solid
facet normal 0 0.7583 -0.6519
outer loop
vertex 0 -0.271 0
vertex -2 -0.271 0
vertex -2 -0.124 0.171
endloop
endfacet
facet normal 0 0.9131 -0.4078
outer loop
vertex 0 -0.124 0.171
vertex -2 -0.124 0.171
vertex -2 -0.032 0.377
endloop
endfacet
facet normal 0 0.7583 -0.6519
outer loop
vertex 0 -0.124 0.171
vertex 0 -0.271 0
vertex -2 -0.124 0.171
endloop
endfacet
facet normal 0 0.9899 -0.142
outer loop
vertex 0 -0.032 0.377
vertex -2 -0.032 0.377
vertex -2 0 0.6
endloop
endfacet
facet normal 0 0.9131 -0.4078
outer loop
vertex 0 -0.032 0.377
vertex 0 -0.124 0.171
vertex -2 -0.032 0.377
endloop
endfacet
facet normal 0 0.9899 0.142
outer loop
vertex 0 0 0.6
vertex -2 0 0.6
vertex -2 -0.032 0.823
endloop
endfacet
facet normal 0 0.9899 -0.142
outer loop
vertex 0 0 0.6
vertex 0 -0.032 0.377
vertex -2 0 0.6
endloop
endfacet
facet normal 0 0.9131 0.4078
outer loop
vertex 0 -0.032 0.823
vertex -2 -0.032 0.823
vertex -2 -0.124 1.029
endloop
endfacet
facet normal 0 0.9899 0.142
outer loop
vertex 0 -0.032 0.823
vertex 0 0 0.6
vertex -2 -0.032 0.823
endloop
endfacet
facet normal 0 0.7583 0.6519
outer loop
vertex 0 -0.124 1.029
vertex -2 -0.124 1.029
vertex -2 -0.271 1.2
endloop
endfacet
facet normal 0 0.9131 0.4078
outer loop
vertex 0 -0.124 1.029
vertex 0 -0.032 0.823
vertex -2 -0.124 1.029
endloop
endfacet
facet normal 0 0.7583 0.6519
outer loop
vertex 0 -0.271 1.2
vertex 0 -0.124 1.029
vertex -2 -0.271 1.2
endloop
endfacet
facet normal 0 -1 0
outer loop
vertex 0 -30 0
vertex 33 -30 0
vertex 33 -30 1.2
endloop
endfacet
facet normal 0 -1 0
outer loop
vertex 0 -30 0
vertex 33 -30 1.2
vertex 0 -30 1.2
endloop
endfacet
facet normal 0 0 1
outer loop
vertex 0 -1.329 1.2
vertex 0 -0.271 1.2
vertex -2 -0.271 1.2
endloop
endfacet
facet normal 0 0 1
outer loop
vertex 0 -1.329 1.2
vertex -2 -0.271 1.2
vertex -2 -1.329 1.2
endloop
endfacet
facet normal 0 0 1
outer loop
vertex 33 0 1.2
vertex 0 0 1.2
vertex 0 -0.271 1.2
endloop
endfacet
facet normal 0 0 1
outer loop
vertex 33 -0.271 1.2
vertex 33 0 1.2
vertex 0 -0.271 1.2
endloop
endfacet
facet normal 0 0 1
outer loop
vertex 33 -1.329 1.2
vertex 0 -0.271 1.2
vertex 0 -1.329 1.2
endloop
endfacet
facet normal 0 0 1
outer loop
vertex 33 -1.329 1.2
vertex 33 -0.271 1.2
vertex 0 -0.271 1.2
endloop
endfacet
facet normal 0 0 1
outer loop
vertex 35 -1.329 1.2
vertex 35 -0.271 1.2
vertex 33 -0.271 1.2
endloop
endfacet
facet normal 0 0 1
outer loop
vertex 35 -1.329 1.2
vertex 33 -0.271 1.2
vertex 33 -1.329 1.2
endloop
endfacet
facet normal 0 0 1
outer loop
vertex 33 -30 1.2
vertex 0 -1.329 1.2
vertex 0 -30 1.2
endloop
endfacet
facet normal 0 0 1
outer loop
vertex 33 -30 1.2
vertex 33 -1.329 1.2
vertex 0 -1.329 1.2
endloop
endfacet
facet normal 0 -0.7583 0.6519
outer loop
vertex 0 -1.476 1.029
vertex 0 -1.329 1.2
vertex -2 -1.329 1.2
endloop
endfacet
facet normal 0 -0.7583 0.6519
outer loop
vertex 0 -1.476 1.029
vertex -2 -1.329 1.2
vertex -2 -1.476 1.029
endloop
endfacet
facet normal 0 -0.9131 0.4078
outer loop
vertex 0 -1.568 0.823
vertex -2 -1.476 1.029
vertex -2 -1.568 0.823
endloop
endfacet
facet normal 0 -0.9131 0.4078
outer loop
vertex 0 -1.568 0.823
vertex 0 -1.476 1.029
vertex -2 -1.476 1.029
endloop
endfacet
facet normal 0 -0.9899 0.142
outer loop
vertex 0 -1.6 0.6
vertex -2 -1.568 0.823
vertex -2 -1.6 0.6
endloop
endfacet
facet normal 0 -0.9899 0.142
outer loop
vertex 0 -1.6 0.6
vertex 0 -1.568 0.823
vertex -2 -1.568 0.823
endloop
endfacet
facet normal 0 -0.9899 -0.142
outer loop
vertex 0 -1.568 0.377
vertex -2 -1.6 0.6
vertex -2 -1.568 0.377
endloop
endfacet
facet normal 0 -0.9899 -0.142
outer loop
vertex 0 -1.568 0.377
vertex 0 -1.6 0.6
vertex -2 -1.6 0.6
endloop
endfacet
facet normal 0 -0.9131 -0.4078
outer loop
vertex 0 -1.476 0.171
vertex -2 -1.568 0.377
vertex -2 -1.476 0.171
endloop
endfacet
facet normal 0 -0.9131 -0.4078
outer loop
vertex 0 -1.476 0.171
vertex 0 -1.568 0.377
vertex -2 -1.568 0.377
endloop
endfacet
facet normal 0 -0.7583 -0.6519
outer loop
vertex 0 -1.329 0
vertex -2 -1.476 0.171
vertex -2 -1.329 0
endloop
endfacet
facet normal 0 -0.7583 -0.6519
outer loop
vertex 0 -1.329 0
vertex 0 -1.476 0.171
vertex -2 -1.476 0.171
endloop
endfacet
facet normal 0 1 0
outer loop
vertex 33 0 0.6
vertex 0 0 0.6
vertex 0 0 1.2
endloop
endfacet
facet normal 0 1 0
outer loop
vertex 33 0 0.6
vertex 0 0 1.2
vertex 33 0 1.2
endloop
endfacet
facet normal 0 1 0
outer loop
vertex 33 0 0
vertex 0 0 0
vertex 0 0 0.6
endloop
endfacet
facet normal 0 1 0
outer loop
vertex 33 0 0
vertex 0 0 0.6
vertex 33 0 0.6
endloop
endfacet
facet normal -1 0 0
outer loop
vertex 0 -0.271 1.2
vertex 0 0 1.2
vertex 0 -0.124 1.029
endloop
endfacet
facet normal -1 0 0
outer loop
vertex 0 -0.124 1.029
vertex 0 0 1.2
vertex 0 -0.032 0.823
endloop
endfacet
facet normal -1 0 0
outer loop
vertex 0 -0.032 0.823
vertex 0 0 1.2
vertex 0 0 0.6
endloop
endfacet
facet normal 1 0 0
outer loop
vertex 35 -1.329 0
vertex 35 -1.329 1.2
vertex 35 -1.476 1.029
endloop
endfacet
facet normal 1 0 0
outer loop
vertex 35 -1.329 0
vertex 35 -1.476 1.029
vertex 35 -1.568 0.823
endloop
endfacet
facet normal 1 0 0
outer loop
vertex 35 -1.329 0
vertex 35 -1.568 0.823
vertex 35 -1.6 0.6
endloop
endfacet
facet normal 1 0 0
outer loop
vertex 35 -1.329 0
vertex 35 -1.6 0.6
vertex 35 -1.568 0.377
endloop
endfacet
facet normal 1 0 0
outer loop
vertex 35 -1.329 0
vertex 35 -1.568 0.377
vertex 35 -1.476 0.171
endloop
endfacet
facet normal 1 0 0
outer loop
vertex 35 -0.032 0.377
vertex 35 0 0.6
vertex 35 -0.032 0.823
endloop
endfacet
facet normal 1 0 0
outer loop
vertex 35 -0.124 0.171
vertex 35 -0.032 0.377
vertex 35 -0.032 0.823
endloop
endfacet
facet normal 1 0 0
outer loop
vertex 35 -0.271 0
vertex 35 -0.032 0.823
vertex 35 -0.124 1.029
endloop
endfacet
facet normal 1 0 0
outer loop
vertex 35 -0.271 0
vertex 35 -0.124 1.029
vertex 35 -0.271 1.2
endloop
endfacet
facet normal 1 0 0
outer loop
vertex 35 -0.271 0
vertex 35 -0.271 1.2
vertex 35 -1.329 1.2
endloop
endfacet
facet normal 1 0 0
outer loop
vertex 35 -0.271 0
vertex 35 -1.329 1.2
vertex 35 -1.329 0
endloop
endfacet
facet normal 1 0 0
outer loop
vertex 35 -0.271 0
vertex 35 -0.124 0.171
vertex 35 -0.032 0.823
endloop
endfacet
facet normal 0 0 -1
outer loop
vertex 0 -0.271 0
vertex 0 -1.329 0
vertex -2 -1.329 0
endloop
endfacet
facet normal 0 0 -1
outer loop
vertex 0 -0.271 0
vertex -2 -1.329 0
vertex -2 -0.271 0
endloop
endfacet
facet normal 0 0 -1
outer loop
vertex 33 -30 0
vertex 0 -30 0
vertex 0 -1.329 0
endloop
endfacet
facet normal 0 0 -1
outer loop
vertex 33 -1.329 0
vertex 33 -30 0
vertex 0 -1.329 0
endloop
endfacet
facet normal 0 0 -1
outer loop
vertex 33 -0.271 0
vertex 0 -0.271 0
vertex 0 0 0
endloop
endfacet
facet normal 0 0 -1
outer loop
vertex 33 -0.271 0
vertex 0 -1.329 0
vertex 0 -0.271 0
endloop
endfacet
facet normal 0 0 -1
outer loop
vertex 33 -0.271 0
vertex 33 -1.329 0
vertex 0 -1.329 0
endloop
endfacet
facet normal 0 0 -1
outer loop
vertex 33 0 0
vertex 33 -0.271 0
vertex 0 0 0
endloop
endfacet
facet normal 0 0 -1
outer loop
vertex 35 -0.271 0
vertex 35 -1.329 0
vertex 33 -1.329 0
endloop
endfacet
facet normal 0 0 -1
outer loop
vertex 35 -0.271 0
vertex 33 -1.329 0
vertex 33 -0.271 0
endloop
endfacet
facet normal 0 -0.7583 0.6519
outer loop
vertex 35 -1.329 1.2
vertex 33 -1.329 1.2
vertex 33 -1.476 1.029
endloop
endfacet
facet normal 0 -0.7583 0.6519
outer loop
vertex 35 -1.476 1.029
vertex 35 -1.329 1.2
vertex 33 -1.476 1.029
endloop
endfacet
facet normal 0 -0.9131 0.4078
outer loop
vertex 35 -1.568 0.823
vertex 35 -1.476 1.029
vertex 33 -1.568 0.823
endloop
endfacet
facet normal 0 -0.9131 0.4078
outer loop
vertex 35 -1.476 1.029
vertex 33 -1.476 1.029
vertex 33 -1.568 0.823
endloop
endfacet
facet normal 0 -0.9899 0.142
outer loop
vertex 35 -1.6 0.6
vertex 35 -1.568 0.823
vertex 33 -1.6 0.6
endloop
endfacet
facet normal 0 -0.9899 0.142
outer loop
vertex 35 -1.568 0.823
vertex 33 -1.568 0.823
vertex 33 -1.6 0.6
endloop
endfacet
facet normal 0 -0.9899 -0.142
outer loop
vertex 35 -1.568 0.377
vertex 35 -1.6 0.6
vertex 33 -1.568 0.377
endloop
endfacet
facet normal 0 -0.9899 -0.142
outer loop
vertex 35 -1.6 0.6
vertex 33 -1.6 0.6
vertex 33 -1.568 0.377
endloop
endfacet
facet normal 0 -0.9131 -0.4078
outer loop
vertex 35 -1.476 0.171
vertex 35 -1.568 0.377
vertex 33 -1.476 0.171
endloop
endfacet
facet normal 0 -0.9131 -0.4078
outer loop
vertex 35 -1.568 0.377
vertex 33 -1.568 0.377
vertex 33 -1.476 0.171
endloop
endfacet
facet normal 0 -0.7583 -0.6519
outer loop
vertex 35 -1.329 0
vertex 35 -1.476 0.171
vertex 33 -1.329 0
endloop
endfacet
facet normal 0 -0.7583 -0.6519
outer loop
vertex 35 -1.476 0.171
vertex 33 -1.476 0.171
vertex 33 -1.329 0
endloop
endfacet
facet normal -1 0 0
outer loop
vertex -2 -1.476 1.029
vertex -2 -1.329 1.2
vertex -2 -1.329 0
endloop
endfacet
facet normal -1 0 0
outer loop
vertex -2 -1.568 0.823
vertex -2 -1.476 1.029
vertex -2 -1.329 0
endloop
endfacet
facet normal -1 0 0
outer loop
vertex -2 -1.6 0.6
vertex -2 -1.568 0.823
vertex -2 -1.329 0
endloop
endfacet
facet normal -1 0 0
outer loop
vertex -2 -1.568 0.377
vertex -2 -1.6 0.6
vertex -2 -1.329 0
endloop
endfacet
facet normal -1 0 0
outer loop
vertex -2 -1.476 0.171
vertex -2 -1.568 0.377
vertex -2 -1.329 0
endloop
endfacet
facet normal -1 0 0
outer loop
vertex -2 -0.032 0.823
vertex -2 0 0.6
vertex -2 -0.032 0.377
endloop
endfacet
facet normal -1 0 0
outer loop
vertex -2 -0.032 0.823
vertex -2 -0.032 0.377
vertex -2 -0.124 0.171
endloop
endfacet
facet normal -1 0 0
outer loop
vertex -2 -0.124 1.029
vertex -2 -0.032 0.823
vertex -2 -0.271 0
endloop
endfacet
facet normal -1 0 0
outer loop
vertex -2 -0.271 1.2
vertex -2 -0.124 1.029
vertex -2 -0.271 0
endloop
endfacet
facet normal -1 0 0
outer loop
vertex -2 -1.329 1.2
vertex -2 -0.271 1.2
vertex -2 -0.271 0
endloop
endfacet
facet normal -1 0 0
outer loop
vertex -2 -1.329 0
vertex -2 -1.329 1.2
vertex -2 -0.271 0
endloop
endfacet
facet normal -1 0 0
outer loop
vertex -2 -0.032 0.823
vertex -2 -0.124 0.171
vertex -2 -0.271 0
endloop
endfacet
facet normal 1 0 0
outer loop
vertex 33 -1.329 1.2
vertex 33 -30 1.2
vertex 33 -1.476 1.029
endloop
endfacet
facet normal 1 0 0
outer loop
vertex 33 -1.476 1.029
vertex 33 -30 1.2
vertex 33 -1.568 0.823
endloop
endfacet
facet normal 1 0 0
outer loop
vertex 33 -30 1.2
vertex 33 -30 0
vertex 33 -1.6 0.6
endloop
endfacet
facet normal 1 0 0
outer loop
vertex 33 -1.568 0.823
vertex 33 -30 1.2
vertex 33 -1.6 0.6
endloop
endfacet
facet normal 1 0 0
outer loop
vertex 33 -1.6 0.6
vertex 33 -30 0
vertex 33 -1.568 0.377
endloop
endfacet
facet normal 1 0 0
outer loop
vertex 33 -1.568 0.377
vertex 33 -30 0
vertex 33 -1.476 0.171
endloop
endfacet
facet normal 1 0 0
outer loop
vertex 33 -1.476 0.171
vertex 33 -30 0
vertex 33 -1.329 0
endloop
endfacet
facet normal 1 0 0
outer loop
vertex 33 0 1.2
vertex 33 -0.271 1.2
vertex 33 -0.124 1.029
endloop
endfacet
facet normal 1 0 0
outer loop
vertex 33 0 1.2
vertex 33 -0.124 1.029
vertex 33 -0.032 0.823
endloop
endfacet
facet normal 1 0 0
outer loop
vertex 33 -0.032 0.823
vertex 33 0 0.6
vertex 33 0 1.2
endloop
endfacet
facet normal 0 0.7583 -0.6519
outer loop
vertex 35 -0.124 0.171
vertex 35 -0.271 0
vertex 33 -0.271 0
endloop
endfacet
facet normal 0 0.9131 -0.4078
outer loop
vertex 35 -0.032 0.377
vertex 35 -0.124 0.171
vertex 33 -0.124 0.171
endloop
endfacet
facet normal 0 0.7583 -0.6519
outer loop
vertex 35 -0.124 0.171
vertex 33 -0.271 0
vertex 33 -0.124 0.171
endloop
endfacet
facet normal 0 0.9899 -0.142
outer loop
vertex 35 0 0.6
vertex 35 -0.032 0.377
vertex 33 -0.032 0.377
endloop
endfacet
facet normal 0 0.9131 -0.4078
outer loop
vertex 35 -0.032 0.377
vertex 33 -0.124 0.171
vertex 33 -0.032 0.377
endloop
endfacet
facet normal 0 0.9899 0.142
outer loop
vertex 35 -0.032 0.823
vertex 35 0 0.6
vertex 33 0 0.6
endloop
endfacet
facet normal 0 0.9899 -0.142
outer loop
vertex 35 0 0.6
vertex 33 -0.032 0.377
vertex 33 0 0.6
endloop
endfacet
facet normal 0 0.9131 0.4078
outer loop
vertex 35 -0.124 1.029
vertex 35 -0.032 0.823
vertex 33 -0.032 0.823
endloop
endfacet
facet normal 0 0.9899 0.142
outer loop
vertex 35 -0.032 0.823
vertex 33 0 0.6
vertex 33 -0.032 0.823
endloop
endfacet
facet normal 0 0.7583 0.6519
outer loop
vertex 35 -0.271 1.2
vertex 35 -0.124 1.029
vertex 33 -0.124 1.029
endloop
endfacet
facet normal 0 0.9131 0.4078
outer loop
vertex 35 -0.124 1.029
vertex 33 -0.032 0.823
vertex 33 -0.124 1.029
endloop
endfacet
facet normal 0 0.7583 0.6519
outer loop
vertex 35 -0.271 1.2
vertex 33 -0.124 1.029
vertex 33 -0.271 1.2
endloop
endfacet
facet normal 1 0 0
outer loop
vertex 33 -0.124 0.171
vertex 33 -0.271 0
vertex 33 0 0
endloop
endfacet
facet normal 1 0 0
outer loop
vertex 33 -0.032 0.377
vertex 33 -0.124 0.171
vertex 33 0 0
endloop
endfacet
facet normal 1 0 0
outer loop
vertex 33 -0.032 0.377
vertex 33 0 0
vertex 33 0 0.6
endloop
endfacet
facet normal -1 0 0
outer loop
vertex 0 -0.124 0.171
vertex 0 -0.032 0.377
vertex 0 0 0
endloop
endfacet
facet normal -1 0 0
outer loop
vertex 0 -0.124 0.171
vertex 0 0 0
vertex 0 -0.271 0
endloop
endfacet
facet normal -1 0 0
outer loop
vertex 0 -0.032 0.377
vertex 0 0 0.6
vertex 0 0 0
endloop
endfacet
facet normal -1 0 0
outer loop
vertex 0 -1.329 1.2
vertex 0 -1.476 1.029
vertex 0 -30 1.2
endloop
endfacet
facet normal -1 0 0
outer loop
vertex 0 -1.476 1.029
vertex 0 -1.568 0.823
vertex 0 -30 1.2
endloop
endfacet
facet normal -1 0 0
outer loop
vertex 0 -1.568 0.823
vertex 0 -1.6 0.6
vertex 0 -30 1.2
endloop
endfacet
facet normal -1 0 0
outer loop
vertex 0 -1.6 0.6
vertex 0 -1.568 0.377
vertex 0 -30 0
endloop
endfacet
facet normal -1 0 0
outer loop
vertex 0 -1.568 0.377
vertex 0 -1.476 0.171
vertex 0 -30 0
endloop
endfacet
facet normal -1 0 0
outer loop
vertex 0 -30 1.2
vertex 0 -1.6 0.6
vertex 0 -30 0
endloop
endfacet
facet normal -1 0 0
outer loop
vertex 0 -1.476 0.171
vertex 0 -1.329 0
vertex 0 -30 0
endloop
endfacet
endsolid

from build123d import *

# Parameters (mm, degrees)
BOSS_EXTRUDE1_DEPTH = 1.2
BOSS_EXTRUDE3_DEPTH = 2


# Read off the part's stored shape, not the designer's step: Boss-Extrude3
with BuildPart() as part:
    # Sketch1 → Boss-Extrude1 (new body)
    with BuildSketch(Plane.XY):
        Polygon((0, 0), (33, 0), (33, -1.2), (33, -30), (0, -30), (0, -1.2), align=None)
    extrude(amount=BOSS_EXTRUDE1_DEPTH)

    # Boss-Extrude3 outline → Boss-Extrude3 (add)
    with BuildSketch(Plane(origin=(33, 0, 0), x_dir=(0, 0, -1), z_dir=(1, 0, 0))):
        with BuildLine():
            ThreePointArc((0, -0.270849738), (-0.6, 0), (-1.2, -0.270849738))
            Line((-1.2, -0.270849738), (-1.2, -1.329150262))
            ThreePointArc((-1.2, -1.329150262), (-0.6, -1.6), (0, -1.329150262))
            Line((0, -1.329150262), (0, -0.270849738))
        make_face()
    boss_extrude3 = extrude(amount=BOSS_EXTRUDE3_DEPTH)

    # Mirror1: Boss-Extrude3 across plane
    add(boss_extrude3.mirror(Plane.ZY.offset(-16.5)))


solid = part.part
